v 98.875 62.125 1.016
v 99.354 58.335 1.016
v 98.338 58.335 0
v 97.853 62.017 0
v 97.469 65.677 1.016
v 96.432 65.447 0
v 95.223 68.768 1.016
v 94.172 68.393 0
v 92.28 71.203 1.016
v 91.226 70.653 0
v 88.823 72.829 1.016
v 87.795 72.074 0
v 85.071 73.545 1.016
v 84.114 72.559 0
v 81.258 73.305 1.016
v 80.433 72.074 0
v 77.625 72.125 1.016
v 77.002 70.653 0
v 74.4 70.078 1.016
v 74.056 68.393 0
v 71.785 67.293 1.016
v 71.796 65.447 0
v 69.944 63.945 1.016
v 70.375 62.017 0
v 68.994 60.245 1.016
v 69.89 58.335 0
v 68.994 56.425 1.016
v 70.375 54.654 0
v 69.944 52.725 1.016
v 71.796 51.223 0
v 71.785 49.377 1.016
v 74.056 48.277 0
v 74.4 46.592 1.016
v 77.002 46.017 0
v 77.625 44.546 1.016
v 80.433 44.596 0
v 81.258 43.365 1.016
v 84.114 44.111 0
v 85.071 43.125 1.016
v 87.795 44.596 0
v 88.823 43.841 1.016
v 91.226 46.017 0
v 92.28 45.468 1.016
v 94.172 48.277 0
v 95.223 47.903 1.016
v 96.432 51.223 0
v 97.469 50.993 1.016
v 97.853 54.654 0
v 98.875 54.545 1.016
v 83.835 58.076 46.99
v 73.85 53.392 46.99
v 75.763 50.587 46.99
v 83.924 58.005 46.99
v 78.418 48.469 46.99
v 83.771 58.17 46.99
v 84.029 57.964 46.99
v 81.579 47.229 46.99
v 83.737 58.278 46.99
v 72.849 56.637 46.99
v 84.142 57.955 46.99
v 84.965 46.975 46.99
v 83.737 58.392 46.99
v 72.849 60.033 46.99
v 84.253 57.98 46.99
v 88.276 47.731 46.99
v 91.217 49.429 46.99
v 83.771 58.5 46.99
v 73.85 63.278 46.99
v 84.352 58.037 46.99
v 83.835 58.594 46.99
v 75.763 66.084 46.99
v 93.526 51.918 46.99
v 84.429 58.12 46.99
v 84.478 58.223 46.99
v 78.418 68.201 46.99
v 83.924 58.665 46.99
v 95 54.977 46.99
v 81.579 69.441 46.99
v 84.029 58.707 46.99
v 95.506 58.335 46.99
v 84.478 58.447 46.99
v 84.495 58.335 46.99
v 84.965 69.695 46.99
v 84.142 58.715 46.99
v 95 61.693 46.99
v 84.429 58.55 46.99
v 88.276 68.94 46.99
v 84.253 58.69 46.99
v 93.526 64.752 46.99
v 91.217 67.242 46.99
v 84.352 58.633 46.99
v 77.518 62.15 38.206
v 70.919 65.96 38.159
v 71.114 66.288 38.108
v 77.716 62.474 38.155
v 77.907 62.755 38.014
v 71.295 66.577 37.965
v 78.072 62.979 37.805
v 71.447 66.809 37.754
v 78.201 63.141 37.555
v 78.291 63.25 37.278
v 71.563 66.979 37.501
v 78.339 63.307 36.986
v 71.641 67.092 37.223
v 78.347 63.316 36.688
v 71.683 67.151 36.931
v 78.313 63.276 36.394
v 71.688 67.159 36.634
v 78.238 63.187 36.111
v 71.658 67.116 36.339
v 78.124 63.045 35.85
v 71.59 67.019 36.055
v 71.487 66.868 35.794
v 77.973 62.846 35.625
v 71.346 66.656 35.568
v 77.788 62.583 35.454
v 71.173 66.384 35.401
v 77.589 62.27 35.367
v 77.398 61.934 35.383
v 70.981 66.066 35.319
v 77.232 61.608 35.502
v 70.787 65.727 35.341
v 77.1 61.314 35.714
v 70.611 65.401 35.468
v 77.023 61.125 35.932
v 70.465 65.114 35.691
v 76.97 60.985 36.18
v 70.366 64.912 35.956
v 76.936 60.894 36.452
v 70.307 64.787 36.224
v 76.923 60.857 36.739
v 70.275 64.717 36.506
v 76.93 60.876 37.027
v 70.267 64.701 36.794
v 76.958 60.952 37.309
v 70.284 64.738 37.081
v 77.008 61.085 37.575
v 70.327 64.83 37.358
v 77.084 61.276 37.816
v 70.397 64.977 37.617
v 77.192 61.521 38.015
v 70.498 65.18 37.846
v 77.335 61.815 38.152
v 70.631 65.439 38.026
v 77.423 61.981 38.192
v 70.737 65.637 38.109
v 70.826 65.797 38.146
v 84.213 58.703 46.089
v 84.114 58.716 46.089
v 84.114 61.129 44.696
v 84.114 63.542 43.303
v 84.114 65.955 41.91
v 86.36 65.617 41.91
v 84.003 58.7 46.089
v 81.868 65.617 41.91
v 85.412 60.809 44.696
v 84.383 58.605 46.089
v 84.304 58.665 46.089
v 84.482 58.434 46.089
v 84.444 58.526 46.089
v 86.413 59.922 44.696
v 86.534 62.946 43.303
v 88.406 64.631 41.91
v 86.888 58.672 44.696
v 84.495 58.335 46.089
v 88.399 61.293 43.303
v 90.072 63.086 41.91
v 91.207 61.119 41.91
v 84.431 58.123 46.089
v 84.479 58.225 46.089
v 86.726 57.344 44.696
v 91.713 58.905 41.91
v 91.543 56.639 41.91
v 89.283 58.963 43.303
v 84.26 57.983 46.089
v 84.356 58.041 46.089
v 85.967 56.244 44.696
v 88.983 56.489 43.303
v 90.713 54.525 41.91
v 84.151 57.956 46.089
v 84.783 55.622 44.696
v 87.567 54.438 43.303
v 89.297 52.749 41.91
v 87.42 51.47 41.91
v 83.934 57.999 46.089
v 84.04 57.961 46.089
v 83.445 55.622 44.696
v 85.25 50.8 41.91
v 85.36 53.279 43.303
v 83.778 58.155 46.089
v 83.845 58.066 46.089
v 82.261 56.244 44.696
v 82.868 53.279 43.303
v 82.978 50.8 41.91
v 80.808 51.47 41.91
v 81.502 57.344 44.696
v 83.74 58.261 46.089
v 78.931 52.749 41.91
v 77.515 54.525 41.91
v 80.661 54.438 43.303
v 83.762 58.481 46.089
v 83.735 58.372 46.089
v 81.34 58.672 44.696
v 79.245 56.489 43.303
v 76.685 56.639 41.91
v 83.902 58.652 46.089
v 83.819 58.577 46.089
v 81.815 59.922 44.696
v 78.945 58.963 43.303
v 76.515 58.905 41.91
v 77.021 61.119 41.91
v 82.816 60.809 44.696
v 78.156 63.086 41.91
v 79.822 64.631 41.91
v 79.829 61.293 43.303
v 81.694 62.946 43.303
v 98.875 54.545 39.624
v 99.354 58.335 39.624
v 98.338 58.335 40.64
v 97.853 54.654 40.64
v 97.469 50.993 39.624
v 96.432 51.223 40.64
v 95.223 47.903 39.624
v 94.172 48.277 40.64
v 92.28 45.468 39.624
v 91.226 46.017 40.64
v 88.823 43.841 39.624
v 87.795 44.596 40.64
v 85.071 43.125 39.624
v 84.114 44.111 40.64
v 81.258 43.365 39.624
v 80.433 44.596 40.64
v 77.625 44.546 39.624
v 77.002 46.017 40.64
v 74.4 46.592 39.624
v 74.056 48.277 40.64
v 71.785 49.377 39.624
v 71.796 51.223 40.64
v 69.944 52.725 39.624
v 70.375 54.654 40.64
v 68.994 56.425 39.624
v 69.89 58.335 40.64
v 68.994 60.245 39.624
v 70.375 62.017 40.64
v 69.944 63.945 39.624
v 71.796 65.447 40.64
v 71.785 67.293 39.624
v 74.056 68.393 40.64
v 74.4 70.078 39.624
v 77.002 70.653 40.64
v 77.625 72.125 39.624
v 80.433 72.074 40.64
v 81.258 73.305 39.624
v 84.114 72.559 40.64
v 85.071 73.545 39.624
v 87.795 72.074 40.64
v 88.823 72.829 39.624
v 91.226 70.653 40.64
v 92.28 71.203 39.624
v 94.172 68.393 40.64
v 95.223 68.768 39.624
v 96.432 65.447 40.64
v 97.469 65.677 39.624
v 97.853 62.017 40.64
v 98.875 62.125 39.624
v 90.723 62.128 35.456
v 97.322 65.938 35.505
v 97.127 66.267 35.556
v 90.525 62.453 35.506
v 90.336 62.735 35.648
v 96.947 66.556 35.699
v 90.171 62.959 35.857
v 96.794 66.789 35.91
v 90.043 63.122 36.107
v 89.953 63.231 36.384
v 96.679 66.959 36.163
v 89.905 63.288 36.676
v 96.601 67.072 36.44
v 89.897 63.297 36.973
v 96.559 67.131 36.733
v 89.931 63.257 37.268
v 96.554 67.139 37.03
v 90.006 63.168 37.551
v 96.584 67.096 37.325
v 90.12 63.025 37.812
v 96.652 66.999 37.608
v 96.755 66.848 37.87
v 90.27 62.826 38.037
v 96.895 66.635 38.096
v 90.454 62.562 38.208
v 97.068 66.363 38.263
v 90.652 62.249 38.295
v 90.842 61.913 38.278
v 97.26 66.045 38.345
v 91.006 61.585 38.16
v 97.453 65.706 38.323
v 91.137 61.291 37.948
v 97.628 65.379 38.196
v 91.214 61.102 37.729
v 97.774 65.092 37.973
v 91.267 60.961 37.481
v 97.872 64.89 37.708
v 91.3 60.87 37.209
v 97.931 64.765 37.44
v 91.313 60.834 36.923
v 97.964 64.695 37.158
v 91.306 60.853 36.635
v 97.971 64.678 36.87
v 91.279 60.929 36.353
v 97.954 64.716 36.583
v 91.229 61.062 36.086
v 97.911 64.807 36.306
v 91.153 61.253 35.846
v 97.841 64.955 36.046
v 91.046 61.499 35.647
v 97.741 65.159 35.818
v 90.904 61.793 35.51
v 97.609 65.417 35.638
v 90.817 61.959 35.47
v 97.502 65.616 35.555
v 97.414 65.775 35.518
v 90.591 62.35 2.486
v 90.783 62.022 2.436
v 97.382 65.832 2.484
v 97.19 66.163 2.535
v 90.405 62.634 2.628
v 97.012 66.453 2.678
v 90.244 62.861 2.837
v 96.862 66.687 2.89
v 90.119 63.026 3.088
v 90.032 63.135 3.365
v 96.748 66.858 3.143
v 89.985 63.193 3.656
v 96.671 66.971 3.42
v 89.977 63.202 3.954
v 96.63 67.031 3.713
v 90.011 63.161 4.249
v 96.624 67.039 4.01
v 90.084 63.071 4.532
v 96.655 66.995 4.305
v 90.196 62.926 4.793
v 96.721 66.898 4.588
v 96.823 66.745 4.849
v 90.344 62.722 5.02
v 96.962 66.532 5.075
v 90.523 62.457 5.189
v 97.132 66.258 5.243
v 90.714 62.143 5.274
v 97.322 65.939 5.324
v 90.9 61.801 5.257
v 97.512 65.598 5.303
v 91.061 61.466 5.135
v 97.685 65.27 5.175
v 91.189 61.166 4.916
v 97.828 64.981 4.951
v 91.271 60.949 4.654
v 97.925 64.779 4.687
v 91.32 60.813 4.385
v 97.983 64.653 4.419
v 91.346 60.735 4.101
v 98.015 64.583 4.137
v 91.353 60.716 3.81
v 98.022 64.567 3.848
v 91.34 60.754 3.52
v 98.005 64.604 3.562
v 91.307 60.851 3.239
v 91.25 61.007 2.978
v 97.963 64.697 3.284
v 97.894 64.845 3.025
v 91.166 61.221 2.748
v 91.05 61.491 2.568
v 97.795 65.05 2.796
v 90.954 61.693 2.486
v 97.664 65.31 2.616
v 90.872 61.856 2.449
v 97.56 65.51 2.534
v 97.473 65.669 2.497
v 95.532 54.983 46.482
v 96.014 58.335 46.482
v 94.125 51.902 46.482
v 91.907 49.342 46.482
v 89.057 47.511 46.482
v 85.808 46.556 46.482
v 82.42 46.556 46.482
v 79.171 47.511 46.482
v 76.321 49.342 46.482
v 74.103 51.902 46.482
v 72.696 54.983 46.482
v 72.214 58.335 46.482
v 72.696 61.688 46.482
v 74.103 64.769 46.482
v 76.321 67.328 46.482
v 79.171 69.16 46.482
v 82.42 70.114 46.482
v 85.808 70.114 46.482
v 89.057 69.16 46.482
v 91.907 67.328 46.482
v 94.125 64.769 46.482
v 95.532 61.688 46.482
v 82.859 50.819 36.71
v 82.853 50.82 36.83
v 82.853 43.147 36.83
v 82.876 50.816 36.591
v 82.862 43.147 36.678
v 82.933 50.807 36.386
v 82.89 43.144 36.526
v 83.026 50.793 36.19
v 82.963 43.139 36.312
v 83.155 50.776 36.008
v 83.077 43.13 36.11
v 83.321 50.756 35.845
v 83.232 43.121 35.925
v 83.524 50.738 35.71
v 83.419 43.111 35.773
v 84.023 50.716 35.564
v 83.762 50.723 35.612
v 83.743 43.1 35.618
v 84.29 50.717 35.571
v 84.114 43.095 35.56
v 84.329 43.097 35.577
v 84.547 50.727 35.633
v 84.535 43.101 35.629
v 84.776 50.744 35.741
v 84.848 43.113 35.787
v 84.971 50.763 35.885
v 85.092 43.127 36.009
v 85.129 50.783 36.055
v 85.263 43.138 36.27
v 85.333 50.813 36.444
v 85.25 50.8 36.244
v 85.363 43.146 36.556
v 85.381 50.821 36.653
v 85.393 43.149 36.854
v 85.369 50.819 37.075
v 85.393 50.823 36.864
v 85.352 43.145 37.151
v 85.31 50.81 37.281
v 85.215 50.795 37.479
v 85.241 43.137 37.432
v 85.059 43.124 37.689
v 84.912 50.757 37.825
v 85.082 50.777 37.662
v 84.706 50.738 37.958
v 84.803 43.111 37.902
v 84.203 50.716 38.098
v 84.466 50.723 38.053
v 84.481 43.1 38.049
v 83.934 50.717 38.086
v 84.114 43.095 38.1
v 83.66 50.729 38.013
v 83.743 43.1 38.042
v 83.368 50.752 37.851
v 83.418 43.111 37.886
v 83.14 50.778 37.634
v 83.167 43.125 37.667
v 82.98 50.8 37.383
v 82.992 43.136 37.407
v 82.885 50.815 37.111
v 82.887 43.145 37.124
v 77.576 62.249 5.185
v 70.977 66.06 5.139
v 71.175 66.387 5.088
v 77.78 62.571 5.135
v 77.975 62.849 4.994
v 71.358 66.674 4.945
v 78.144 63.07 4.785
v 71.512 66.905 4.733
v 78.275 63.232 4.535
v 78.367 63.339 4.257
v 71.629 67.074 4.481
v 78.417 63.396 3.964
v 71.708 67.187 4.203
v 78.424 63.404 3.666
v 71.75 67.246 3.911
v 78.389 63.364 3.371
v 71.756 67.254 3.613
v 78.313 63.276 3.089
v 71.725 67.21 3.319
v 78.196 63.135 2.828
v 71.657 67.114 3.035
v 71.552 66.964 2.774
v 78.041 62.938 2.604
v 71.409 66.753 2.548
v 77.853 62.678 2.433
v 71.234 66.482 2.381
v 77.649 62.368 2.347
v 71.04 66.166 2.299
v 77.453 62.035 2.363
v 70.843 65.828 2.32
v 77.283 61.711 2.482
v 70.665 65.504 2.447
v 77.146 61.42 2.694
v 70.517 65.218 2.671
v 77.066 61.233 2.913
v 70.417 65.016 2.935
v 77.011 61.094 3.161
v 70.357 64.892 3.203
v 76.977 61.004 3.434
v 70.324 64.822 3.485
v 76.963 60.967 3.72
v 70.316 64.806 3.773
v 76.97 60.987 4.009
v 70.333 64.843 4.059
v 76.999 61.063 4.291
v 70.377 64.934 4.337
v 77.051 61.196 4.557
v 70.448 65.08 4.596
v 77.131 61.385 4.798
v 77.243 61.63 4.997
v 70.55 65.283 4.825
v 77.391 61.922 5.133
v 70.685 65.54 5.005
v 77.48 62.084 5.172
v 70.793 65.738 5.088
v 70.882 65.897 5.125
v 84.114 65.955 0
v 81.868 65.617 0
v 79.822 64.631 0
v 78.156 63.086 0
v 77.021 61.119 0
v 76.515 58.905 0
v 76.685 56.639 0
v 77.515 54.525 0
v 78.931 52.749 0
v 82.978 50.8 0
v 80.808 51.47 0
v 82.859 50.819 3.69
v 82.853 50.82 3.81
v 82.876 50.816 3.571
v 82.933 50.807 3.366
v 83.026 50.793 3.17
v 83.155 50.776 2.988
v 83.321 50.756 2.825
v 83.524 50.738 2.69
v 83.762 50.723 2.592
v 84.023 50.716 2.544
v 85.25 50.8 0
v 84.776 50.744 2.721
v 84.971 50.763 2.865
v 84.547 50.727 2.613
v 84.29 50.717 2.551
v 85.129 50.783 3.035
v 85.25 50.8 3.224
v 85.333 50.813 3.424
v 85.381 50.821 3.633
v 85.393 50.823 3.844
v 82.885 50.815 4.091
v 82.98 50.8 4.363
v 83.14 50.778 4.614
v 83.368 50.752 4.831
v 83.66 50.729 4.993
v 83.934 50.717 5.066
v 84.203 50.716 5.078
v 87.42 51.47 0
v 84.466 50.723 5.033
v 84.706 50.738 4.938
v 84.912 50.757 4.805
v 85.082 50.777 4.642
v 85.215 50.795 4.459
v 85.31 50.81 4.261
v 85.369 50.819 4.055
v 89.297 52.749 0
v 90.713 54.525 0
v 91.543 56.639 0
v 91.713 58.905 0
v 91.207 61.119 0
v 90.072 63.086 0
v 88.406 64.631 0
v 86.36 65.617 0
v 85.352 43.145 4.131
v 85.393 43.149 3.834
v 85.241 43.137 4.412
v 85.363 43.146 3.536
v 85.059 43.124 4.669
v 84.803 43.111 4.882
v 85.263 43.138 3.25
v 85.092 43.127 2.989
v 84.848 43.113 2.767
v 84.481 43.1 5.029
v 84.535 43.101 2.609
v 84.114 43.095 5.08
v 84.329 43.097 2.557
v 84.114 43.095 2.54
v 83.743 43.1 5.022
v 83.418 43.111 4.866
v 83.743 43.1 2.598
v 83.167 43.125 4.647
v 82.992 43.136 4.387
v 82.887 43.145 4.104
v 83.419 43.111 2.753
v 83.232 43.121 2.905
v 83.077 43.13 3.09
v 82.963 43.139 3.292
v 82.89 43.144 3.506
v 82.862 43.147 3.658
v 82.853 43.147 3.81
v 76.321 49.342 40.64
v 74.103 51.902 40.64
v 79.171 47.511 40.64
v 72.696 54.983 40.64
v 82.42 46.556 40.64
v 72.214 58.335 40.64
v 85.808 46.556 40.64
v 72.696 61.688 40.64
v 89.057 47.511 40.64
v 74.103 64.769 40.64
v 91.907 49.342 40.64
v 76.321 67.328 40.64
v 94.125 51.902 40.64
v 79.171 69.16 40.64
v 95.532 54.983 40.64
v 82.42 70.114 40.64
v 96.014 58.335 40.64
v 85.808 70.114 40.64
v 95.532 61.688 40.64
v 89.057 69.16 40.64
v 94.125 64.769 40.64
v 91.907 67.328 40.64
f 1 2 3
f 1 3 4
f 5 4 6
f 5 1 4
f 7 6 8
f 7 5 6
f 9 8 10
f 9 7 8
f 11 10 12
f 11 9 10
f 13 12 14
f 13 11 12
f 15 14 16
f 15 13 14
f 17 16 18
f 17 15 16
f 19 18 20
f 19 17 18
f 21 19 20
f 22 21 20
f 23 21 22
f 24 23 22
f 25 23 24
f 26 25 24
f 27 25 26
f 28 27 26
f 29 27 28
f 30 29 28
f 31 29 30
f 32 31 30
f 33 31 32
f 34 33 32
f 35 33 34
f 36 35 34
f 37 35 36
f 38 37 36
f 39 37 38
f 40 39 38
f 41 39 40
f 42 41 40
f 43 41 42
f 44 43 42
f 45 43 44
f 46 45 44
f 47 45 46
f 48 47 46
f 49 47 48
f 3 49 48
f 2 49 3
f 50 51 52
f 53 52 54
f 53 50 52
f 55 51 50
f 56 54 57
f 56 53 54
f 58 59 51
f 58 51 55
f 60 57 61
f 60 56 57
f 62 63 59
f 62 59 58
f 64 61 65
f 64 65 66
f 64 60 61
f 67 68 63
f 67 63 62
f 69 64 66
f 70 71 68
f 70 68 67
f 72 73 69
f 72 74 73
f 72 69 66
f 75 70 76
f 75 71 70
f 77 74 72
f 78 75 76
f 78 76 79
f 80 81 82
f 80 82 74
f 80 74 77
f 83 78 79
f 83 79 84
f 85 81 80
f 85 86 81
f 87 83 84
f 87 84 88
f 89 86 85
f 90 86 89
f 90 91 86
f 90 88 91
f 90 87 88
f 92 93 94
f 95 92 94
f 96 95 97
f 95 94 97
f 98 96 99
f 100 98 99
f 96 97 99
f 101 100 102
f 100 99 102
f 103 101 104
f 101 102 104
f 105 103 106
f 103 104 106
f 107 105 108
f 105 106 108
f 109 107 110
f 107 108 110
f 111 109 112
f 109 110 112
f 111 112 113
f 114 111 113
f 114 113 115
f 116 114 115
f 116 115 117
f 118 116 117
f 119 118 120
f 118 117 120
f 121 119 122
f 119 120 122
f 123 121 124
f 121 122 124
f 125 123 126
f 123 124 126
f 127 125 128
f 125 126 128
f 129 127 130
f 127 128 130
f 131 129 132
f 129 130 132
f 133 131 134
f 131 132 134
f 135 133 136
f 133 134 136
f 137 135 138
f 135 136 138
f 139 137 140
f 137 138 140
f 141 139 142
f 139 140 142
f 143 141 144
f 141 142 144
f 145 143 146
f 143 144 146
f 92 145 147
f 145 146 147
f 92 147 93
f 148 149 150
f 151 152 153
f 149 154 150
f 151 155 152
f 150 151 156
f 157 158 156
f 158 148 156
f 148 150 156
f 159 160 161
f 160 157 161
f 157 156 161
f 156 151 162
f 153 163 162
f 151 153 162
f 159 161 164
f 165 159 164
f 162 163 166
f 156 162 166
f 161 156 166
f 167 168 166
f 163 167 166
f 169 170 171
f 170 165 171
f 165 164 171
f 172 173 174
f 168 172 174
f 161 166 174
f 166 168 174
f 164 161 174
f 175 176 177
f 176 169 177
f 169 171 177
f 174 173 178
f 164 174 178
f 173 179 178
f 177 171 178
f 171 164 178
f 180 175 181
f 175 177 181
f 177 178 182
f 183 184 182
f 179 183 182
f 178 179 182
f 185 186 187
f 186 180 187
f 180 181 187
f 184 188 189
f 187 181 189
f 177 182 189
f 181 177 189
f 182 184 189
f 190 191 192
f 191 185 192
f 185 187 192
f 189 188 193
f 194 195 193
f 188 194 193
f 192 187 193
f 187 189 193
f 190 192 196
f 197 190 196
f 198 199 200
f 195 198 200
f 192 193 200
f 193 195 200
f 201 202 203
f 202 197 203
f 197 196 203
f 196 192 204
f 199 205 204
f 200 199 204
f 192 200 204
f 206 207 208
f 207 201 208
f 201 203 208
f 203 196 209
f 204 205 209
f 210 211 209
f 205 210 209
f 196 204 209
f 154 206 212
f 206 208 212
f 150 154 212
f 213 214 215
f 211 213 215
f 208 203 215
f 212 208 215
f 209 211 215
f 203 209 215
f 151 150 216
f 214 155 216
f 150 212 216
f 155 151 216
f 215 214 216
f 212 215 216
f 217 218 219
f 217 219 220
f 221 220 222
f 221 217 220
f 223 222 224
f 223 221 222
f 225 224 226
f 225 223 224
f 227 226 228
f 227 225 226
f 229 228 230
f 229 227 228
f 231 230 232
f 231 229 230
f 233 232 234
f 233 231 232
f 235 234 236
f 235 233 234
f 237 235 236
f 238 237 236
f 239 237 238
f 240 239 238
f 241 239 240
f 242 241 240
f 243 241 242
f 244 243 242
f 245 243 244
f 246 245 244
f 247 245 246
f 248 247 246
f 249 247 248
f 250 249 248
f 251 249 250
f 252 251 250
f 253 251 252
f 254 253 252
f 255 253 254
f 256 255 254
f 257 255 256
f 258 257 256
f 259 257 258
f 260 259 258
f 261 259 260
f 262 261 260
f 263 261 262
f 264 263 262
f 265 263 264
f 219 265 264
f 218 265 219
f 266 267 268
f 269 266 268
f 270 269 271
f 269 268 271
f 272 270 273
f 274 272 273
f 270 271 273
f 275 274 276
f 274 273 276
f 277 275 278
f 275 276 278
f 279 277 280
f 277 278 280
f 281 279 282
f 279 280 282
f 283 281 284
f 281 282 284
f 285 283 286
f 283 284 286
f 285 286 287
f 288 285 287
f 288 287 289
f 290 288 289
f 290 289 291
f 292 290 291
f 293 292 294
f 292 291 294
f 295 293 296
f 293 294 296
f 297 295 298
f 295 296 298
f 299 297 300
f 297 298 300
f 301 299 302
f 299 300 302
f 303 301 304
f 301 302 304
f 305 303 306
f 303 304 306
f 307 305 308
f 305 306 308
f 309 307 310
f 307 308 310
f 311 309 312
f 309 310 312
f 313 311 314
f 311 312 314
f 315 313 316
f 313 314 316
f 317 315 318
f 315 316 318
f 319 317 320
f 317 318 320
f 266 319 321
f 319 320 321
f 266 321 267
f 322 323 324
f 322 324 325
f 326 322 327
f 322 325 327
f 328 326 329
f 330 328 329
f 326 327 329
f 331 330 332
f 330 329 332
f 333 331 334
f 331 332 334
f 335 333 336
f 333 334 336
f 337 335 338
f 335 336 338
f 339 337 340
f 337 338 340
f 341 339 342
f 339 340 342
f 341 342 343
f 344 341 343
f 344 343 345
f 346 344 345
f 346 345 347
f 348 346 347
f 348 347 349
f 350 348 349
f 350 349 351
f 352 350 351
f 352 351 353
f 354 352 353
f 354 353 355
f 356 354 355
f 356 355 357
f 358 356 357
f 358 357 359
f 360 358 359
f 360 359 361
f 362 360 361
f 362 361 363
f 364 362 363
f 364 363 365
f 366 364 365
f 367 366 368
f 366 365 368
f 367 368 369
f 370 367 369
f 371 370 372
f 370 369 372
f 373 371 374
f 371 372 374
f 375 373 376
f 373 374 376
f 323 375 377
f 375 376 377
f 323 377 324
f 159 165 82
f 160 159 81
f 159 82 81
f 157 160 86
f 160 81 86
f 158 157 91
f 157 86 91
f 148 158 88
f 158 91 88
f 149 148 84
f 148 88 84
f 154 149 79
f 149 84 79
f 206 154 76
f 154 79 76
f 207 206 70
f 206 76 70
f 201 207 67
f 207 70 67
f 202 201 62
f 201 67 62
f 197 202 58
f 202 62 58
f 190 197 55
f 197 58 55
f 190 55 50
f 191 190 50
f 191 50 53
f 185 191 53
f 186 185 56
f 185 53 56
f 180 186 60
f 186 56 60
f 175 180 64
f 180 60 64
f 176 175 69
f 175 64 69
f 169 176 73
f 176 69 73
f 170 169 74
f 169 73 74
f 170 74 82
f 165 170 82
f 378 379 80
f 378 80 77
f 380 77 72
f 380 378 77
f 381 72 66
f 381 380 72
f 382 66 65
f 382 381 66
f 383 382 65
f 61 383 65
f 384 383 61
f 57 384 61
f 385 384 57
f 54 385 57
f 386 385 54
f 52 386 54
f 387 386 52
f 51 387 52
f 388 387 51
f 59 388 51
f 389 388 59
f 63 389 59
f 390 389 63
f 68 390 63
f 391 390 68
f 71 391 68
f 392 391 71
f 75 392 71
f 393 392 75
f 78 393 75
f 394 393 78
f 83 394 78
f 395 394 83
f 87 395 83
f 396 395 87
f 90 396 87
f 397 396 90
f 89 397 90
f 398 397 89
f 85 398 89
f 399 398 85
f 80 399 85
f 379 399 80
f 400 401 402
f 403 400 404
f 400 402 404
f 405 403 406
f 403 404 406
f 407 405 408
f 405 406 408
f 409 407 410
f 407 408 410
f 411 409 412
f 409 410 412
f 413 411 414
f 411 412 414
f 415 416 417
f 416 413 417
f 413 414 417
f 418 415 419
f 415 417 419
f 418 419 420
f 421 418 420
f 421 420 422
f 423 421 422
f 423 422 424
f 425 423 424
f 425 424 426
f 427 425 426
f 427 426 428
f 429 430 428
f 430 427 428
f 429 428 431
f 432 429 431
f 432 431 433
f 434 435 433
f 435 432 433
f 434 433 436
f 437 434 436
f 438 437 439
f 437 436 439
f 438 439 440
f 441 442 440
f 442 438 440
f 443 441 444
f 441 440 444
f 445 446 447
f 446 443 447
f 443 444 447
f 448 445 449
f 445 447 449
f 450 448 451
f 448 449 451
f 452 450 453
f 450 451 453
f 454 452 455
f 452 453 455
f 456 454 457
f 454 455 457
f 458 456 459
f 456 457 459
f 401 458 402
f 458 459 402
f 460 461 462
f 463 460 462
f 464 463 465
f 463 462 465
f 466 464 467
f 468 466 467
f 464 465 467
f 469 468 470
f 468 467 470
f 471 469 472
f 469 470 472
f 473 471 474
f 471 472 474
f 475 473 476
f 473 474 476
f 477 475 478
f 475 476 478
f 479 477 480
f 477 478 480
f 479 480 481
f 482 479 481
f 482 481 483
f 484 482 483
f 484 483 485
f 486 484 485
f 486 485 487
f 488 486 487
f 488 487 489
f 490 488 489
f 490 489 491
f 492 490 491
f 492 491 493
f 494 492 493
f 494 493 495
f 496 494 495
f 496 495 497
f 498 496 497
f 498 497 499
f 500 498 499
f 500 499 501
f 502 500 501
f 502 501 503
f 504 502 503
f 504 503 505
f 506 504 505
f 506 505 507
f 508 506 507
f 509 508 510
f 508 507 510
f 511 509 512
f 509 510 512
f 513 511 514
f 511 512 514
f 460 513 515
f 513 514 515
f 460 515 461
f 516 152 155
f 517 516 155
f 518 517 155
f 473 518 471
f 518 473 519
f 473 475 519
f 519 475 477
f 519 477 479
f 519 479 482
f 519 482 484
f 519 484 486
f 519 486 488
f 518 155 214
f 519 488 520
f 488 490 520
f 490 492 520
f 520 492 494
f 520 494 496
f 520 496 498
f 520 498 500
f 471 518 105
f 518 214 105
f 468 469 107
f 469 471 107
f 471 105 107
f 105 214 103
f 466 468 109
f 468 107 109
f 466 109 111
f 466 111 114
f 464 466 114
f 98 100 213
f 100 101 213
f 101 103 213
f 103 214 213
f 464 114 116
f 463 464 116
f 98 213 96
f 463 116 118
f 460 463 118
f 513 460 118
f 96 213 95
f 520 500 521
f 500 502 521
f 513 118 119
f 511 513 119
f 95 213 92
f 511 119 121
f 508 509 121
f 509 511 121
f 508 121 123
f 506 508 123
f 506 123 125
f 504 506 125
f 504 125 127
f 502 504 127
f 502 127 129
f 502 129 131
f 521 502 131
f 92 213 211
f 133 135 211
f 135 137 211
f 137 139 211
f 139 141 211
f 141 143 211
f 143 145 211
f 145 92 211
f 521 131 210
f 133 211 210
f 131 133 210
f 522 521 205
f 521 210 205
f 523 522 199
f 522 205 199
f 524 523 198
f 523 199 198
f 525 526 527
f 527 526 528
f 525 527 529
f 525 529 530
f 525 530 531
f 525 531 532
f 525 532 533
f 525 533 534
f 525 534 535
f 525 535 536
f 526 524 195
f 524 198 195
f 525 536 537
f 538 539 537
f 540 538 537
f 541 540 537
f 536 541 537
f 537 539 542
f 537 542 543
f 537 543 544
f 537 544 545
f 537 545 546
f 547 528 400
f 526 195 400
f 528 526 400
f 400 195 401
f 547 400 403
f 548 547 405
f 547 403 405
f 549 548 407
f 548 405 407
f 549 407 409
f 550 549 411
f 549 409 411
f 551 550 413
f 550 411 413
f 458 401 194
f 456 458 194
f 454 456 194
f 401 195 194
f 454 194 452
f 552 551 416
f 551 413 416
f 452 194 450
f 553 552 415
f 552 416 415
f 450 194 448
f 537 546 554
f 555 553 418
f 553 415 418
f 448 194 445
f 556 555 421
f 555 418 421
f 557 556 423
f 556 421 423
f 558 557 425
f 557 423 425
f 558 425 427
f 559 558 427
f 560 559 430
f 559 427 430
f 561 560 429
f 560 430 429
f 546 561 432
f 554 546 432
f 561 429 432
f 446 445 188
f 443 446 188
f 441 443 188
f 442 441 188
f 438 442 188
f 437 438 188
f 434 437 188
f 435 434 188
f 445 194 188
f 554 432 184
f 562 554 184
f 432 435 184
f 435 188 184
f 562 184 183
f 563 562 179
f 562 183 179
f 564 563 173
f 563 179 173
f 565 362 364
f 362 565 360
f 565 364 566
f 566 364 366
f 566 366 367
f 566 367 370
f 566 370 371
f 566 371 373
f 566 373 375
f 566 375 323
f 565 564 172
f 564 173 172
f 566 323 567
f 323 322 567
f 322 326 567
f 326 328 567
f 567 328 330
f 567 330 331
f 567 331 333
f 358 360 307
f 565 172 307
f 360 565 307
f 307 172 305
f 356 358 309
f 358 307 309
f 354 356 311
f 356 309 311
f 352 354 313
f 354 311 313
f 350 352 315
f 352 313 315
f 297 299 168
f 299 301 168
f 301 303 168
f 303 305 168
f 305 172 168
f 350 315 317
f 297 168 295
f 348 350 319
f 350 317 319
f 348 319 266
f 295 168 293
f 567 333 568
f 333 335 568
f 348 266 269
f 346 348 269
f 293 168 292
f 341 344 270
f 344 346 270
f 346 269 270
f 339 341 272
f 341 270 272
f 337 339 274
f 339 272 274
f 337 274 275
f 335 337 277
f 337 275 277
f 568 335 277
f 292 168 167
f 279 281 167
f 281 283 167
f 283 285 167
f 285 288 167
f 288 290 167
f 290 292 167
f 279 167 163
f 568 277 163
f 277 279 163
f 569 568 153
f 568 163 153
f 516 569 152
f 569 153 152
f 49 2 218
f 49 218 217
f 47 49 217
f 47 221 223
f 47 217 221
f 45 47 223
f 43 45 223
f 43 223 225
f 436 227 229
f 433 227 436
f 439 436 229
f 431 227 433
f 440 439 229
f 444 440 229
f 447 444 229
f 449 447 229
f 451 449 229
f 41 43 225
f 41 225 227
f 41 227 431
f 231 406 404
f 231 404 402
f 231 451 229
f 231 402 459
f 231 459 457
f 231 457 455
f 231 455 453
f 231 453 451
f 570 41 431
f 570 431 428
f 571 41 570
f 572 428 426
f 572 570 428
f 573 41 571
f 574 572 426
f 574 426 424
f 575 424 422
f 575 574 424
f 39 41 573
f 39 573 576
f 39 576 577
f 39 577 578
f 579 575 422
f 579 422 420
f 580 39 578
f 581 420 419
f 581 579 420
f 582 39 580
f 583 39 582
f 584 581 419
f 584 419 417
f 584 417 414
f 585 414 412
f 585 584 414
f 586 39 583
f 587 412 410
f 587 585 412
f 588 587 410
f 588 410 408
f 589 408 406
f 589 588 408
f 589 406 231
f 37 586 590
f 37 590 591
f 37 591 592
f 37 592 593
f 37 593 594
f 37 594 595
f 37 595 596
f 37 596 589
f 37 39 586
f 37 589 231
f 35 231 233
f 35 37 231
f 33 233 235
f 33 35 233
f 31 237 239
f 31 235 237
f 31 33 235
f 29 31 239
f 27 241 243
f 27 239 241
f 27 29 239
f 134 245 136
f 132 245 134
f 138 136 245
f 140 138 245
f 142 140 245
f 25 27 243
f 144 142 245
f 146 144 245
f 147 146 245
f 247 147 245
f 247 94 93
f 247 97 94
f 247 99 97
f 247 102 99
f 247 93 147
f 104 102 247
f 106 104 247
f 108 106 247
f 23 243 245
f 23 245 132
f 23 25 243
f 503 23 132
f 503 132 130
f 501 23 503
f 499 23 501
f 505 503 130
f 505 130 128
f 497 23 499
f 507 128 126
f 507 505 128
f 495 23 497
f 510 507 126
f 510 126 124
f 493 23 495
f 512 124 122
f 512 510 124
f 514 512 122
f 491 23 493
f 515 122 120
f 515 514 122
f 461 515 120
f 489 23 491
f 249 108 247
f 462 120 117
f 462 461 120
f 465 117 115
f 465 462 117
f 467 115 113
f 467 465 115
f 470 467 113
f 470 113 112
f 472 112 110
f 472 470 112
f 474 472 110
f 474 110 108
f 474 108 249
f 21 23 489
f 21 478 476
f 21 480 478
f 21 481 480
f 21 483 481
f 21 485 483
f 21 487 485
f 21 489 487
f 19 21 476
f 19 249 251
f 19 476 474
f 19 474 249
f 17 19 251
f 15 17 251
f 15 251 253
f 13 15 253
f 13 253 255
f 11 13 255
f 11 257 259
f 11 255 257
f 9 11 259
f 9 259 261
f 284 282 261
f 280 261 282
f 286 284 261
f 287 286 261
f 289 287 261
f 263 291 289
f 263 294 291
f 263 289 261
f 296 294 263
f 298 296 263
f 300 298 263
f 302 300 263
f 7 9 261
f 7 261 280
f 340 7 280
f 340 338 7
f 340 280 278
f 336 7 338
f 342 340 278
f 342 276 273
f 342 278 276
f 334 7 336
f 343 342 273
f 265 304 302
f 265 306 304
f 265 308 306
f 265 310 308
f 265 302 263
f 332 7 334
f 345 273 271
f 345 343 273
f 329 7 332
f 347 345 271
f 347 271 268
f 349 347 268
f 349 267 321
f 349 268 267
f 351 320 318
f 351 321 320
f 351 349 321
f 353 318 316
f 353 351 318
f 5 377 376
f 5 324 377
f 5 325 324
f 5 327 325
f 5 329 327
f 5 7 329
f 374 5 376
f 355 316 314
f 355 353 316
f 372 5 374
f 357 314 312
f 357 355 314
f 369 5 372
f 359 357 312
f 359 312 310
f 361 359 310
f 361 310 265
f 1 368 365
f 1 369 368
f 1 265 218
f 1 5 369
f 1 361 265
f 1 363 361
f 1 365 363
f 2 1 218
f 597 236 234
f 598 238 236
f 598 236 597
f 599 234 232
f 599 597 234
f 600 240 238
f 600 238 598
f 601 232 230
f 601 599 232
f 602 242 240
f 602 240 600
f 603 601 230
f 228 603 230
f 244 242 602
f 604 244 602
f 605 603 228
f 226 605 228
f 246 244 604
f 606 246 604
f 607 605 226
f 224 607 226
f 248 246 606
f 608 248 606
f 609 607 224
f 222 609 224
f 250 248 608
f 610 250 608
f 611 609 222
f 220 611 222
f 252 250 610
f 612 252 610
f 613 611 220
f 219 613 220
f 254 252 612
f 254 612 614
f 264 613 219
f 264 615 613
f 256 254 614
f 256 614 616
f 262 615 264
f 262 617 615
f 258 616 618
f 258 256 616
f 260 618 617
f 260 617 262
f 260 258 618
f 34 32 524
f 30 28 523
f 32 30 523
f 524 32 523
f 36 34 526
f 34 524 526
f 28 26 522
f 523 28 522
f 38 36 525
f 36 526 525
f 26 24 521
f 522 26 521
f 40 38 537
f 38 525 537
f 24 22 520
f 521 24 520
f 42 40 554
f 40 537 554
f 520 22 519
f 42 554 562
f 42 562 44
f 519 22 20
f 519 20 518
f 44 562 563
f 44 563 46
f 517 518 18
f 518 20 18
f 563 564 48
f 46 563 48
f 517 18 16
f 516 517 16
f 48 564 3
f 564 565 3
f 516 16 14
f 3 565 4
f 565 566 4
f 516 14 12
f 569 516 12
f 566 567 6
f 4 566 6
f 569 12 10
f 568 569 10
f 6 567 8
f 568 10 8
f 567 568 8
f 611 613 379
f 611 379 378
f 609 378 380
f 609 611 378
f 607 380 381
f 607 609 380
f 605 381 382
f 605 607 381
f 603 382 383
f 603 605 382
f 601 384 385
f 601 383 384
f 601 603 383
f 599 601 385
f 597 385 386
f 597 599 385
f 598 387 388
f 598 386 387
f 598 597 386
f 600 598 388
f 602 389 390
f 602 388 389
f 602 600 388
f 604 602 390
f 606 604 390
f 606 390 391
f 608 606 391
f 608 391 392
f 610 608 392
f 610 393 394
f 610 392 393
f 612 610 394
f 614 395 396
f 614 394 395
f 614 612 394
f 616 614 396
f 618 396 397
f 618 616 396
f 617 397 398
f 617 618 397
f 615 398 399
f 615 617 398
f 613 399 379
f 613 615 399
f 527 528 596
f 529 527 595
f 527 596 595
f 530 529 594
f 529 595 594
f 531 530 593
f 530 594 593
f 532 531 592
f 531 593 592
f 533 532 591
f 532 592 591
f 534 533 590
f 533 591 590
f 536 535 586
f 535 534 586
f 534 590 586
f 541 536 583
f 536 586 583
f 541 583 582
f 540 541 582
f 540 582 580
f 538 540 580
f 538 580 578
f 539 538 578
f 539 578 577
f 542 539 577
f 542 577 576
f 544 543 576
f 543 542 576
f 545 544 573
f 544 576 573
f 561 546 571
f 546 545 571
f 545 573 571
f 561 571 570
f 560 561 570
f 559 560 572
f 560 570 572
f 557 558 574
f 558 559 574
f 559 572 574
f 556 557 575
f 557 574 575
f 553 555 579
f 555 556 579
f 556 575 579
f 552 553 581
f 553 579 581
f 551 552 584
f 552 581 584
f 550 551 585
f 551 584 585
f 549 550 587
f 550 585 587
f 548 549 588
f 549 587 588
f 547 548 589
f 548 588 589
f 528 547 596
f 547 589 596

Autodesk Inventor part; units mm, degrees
ref_plane "YZ Plane" through (0, 0, 0) normal (1, 0, 0) x (0, 1, 0)
ref_plane "XY Plane" through (0, 0, 0) normal (0, 0, 1) x (1, 0, 0)
sketch "Sketch1" plane through (0, 0, 0) normal (0, 0, 1) x (1, 0, 0)
  circle A0 centre (84.114, 58.3351) radius 15.24
  line L0 (84.114, 61.4651) -> (84.114, 53.9668)
  line L1 (87.092, 58.3351) -> (81.5348, 58.3351)
  point P0 (0, 0)
  dimension "d0" = 30.48
extrude "Extrusion1" add sketch "Sketch1" along normal blind 40.64
sketch "Sketch2" plane through (84.114, 58.3351, 40.64) normal (0, 0, 1) x (1, 0, 0)
  circle A0 centre (0, 0) radius 11.8999
  circle A1 centre (0, 0) radius 0.381
  point P0 (-84.114, -58.3351)
  dimension "d3" = 23.7998
  dimension "d62" = 0.762
extrude "Extrusion2" add sketch "Sketch2" along normal blind 6.35 contours A0 | A1
chamfer "Chamfer1" distance 0.508 angle 45 1 edges at (72.2141, 58.3351, 46.99)
chamfer "Chamfer2" distance 1.016 angle 45 1 edges at (68.874, 58.3351, 40.64)
thread "Thread2" size "M25x1" class "6g" standard "ANSI Metric M Profile" full length
sketch "Sketch4" plane through (84.114, 58.3351, 0) normal (0, 0, -1) x (-1, 0, 0)
  circle A0 centre (0, 0) radius 11.8999 projected
  point P0 (84.114, -58.3351)
hole "Hole1" at (84.114, 58.3351, 0) direction (0, 0, 1) diameter 15.24 depth 41.91 tip angle 120
chamfer "Chamfer3" distance 1.016 angle 45 1 edges at (68.874, 58.3351, 0)
sketch "Sketch9" plane through (84.114, 58.3351, 46.99) normal (0, 0, 1) x (1, 0, 0)
  point P0 (0, 0)
hole "Hole3" at (84.114, 58.3351, 46.99) direction (0, 0, 1) diameter 0.762 depth 41.91 tip angle 120
sketch "Sketch10" plane through (84.114, 58.3351, 46.99) normal (0, 0, 1) x (1, 0, 0)
  circle A0 centre (0, 0) radius 0.381
  point P0 (-84.114, -58.3351)
  dimension "d63" = 0.762
extrude "Extrusion6" cut sketch "Sketch10" against normal blind 7.62
ref_plane "Work Plane11" through (84.114, 43.0951, 0) normal (0, 1, 0) x (-1, 0, 0)
sketch "Sketch12" plane through (84.114, 43.0951, 0) normal (0, 1, 0) x (-1, 0, 0)
  circle A0 centre (0, 36.83) radius 1.4224
  circle A1 centre (0, 3.81) radius 1.4224
  point P0 (84.114, 0)
  dimension "d68" = 2.8448
  dimension "d69" = 2.8448
  dimension "d71" = 33.02
sketch "Sketch19" plane through (84.114, 43.0951, 0) normal (0, 1, 0) x (-1, 0, 0)
  point P0 (84.114, 0)
sketch "Sketch20" plane through (84.114, 43.0951, 0) normal (0, 1, 0) x (-1, 0, 0)
  circle A0 centre (-0.009, 36.83) radius 1.27
  circle A1 centre (-0.009, 3.81) radius 1.27
  line L0 (-11.3919, 46.99) -> (11.3919, 46.99) projected
  point P0 (84.114, 0)
  dimension "d78" = 2.54
  dimension "d79" = 2.54
  dimension "d80" = 10.16
  dimension "d81" = 33.02
extrude "Extrusion9" cut sketch "Sketch20" along normal blind 8.89
sketch "Sketch21" plane through (84.114, 43.0951, 0) normal (0, 1, 0) x (-1, 0, 0)
  point P0 (84.114, 0)
sketch "Sketch22" plane through (84.114, 43.0951, 0) normal (0, 1, 0) x (-1, 0, 0)
  point P0 (84.114, 0)
  point P1 (27.3328, 48.7683)
  point P2 (26.9749, -2.1467)
  point P3 (-27.3472, -1.8634)
  point P4 (-26.971, 48.9999)
ref_plane "Work Plane17" through (57.1391, 43.0951, -2.1467) normal (-0.866, 0.5, -0.0061) x (-0.007, 0, 1)
sketch "Sketch23" plane through (57.1391, 43.0951, -2.1467) normal (-0.866, 0.5, -0.0061) x (-0.007, 0, 1)
  circle A0 centre (38.7859, 26.8321) radius 1.4224
  circle A1 centre (5.7659, 26.8321) radius 1.4224
  ellipse E0 centre (48.9459, 26.858) end of major axis (48.9058, 38.2499) minor radius 0.0694 projected
  point P0 (2.5484, -65.8828)
  dimension "d88" = 2.8448
  dimension "d89" = 2.8448
  dimension "d90" = 10.16
  dimension "d91" = 33.02
extrude "Extrusion10" cut sketch "Sketch23" against normal blind 8.89 contours A0 | A1
ref_plane "Work Plane18" through (111.085, 43.0951, 48.9999) normal (0.866, 0.5, 0.0064) x (0.0074, 0, -1)
sketch "Sketch24" plane through (111.085, 43.0951, 48.9999) normal (0.866, 0.5, 0.0064) x (0.0074, 0, -1)
  circle A0 centre (11.9704, 26.7143) radius 1.4224
  circle A1 centre (44.9904, 26.7143) radius 1.4224
  ellipse E0 centre (1.8104, 26.6908) end of major axis (1.7683, 38.0826) minor radius 0.073 projected
  point P0 (48.177, 18.4007)
  dimension "d95" = 2.8448
  dimension "d96" = 2.8448
  dimension "d97" = 10.16
  dimension "d98" = 33.02
extrude "Extrusion11" cut sketch "Sketch24" against normal blind 8.89 contours A0 | A1
thread "Thread3" size "4-40 UNC" class "2B" standard "ANSI Unified Screw Threads" full length
properties part number "laserfocus"
